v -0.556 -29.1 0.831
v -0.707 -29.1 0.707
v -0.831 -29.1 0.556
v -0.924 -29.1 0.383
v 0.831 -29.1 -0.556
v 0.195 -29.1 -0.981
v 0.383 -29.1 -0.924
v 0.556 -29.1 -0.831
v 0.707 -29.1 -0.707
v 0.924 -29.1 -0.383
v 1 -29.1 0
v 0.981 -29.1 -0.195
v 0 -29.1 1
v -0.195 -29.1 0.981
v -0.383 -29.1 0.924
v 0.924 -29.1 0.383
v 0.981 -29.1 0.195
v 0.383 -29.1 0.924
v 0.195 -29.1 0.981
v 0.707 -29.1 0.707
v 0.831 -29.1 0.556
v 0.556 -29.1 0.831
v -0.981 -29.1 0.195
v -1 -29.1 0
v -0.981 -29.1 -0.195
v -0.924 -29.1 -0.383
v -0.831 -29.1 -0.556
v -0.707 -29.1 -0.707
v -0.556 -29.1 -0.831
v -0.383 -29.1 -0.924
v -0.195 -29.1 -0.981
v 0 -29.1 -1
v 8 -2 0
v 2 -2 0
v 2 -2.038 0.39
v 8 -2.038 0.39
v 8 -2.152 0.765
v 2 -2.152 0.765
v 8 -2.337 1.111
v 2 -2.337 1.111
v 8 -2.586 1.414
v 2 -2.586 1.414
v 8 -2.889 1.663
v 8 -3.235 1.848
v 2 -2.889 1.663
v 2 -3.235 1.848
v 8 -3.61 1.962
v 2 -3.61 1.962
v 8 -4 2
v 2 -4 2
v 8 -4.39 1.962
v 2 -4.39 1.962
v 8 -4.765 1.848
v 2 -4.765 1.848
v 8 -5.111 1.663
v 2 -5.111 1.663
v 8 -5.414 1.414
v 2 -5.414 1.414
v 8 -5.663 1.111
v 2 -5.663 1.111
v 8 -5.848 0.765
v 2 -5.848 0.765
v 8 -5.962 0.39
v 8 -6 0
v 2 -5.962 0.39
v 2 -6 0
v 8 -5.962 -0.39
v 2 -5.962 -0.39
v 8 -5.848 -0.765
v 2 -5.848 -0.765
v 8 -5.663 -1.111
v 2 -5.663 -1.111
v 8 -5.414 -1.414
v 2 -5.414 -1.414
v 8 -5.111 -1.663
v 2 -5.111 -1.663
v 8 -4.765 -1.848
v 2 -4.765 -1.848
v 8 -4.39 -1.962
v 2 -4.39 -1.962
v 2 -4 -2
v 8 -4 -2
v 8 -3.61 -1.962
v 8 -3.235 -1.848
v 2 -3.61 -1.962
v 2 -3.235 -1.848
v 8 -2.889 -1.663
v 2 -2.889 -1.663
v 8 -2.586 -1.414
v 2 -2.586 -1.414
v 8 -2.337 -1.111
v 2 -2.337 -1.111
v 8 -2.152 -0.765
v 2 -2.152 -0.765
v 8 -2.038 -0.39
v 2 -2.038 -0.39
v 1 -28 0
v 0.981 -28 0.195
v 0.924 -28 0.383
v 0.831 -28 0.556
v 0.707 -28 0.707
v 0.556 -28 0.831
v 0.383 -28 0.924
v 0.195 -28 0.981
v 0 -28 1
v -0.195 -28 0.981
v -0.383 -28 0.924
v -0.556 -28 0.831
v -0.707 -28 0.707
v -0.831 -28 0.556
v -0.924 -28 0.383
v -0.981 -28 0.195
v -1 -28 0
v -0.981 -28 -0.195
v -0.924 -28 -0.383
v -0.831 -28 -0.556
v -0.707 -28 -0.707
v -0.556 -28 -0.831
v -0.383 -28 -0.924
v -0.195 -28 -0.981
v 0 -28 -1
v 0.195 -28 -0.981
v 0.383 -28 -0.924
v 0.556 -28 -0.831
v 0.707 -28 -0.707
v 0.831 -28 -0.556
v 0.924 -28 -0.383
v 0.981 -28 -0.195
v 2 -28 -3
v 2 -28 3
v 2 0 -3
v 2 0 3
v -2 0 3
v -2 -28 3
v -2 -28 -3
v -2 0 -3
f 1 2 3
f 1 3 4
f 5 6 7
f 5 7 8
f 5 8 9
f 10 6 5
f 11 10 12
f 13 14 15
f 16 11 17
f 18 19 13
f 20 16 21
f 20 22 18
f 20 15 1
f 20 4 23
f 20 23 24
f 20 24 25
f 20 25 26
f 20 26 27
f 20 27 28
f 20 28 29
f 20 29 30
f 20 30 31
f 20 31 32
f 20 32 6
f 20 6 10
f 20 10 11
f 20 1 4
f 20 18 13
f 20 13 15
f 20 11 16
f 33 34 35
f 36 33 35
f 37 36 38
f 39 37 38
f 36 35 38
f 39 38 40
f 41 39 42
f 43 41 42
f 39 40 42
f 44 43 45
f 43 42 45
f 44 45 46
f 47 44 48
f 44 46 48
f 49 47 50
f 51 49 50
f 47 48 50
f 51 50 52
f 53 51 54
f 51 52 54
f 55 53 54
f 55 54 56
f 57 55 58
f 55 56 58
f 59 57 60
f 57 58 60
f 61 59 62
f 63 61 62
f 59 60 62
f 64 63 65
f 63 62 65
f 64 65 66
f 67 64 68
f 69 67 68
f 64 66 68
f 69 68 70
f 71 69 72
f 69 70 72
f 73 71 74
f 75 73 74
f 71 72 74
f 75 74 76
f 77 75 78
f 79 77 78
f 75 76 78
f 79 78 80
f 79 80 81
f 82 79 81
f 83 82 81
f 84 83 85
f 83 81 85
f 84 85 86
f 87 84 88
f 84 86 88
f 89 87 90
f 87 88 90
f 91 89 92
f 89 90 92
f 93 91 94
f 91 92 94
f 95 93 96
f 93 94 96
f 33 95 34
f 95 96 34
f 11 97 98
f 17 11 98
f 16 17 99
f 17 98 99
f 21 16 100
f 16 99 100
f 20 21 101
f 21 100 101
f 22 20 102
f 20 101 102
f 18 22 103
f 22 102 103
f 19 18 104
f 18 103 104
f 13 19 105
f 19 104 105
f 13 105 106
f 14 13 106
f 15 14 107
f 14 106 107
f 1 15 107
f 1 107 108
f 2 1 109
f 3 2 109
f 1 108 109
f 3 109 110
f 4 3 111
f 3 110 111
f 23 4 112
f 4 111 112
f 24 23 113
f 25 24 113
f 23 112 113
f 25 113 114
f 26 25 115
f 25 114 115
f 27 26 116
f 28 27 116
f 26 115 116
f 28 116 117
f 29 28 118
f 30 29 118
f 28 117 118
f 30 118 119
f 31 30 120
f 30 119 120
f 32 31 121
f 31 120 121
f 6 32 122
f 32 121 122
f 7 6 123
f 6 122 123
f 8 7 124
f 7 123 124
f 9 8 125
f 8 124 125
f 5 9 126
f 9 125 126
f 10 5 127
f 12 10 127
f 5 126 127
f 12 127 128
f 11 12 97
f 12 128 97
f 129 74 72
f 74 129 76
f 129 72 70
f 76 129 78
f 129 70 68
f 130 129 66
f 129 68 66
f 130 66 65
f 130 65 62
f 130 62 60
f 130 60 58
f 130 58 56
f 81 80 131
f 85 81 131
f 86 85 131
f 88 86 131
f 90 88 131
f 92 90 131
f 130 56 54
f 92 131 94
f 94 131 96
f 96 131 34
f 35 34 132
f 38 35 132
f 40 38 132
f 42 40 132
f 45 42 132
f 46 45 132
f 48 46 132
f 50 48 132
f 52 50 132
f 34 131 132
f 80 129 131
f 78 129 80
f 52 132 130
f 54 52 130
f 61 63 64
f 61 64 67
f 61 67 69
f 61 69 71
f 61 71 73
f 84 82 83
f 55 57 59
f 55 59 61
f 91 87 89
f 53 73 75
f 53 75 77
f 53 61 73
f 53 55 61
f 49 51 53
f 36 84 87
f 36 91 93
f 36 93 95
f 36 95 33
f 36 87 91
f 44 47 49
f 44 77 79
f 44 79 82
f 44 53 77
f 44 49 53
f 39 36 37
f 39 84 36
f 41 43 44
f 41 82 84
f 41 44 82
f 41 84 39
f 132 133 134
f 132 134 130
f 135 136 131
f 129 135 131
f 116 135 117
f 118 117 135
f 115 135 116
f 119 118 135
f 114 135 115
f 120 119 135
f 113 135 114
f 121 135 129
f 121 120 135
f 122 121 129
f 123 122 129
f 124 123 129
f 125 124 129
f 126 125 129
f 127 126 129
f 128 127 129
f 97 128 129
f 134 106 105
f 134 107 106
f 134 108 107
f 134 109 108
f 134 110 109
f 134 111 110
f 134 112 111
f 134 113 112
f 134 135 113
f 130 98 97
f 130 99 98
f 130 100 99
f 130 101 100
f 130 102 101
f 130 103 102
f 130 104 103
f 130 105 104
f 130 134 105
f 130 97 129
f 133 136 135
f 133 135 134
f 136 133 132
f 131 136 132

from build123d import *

# Parameters (mm, degrees)
F0_W     = 4
F0_H     = 6
F1_DEPTH = 28
F2_R     = 2
F3_DEPTH = 6
F4_R     = 1
F5_DEPTH = 1.1


# Not quite as in the source:
# - a feature names something its author has since deleted; it is built from what else it names


with BuildPart() as f1:
    # F0 (on Front) → F1 (new body)
    with BuildSketch(Plane.XZ):
        Rectangle(F0_W, F0_H)
    extrude(amount=F1_DEPTH)

    # F2 (on face) → F3 (join)
    with BuildSketch(Plane.YZ.offset(2)):
        with Locations((-4, 0)):
            Circle(F2_R)
    extrude(amount=F3_DEPTH)

    # F4 (on face) → F5 (join)
    with BuildSketch(Plane.XZ.offset(28)):
        Circle(F4_R)
    extrude(amount=F5_DEPTH)


solid = f1.part
